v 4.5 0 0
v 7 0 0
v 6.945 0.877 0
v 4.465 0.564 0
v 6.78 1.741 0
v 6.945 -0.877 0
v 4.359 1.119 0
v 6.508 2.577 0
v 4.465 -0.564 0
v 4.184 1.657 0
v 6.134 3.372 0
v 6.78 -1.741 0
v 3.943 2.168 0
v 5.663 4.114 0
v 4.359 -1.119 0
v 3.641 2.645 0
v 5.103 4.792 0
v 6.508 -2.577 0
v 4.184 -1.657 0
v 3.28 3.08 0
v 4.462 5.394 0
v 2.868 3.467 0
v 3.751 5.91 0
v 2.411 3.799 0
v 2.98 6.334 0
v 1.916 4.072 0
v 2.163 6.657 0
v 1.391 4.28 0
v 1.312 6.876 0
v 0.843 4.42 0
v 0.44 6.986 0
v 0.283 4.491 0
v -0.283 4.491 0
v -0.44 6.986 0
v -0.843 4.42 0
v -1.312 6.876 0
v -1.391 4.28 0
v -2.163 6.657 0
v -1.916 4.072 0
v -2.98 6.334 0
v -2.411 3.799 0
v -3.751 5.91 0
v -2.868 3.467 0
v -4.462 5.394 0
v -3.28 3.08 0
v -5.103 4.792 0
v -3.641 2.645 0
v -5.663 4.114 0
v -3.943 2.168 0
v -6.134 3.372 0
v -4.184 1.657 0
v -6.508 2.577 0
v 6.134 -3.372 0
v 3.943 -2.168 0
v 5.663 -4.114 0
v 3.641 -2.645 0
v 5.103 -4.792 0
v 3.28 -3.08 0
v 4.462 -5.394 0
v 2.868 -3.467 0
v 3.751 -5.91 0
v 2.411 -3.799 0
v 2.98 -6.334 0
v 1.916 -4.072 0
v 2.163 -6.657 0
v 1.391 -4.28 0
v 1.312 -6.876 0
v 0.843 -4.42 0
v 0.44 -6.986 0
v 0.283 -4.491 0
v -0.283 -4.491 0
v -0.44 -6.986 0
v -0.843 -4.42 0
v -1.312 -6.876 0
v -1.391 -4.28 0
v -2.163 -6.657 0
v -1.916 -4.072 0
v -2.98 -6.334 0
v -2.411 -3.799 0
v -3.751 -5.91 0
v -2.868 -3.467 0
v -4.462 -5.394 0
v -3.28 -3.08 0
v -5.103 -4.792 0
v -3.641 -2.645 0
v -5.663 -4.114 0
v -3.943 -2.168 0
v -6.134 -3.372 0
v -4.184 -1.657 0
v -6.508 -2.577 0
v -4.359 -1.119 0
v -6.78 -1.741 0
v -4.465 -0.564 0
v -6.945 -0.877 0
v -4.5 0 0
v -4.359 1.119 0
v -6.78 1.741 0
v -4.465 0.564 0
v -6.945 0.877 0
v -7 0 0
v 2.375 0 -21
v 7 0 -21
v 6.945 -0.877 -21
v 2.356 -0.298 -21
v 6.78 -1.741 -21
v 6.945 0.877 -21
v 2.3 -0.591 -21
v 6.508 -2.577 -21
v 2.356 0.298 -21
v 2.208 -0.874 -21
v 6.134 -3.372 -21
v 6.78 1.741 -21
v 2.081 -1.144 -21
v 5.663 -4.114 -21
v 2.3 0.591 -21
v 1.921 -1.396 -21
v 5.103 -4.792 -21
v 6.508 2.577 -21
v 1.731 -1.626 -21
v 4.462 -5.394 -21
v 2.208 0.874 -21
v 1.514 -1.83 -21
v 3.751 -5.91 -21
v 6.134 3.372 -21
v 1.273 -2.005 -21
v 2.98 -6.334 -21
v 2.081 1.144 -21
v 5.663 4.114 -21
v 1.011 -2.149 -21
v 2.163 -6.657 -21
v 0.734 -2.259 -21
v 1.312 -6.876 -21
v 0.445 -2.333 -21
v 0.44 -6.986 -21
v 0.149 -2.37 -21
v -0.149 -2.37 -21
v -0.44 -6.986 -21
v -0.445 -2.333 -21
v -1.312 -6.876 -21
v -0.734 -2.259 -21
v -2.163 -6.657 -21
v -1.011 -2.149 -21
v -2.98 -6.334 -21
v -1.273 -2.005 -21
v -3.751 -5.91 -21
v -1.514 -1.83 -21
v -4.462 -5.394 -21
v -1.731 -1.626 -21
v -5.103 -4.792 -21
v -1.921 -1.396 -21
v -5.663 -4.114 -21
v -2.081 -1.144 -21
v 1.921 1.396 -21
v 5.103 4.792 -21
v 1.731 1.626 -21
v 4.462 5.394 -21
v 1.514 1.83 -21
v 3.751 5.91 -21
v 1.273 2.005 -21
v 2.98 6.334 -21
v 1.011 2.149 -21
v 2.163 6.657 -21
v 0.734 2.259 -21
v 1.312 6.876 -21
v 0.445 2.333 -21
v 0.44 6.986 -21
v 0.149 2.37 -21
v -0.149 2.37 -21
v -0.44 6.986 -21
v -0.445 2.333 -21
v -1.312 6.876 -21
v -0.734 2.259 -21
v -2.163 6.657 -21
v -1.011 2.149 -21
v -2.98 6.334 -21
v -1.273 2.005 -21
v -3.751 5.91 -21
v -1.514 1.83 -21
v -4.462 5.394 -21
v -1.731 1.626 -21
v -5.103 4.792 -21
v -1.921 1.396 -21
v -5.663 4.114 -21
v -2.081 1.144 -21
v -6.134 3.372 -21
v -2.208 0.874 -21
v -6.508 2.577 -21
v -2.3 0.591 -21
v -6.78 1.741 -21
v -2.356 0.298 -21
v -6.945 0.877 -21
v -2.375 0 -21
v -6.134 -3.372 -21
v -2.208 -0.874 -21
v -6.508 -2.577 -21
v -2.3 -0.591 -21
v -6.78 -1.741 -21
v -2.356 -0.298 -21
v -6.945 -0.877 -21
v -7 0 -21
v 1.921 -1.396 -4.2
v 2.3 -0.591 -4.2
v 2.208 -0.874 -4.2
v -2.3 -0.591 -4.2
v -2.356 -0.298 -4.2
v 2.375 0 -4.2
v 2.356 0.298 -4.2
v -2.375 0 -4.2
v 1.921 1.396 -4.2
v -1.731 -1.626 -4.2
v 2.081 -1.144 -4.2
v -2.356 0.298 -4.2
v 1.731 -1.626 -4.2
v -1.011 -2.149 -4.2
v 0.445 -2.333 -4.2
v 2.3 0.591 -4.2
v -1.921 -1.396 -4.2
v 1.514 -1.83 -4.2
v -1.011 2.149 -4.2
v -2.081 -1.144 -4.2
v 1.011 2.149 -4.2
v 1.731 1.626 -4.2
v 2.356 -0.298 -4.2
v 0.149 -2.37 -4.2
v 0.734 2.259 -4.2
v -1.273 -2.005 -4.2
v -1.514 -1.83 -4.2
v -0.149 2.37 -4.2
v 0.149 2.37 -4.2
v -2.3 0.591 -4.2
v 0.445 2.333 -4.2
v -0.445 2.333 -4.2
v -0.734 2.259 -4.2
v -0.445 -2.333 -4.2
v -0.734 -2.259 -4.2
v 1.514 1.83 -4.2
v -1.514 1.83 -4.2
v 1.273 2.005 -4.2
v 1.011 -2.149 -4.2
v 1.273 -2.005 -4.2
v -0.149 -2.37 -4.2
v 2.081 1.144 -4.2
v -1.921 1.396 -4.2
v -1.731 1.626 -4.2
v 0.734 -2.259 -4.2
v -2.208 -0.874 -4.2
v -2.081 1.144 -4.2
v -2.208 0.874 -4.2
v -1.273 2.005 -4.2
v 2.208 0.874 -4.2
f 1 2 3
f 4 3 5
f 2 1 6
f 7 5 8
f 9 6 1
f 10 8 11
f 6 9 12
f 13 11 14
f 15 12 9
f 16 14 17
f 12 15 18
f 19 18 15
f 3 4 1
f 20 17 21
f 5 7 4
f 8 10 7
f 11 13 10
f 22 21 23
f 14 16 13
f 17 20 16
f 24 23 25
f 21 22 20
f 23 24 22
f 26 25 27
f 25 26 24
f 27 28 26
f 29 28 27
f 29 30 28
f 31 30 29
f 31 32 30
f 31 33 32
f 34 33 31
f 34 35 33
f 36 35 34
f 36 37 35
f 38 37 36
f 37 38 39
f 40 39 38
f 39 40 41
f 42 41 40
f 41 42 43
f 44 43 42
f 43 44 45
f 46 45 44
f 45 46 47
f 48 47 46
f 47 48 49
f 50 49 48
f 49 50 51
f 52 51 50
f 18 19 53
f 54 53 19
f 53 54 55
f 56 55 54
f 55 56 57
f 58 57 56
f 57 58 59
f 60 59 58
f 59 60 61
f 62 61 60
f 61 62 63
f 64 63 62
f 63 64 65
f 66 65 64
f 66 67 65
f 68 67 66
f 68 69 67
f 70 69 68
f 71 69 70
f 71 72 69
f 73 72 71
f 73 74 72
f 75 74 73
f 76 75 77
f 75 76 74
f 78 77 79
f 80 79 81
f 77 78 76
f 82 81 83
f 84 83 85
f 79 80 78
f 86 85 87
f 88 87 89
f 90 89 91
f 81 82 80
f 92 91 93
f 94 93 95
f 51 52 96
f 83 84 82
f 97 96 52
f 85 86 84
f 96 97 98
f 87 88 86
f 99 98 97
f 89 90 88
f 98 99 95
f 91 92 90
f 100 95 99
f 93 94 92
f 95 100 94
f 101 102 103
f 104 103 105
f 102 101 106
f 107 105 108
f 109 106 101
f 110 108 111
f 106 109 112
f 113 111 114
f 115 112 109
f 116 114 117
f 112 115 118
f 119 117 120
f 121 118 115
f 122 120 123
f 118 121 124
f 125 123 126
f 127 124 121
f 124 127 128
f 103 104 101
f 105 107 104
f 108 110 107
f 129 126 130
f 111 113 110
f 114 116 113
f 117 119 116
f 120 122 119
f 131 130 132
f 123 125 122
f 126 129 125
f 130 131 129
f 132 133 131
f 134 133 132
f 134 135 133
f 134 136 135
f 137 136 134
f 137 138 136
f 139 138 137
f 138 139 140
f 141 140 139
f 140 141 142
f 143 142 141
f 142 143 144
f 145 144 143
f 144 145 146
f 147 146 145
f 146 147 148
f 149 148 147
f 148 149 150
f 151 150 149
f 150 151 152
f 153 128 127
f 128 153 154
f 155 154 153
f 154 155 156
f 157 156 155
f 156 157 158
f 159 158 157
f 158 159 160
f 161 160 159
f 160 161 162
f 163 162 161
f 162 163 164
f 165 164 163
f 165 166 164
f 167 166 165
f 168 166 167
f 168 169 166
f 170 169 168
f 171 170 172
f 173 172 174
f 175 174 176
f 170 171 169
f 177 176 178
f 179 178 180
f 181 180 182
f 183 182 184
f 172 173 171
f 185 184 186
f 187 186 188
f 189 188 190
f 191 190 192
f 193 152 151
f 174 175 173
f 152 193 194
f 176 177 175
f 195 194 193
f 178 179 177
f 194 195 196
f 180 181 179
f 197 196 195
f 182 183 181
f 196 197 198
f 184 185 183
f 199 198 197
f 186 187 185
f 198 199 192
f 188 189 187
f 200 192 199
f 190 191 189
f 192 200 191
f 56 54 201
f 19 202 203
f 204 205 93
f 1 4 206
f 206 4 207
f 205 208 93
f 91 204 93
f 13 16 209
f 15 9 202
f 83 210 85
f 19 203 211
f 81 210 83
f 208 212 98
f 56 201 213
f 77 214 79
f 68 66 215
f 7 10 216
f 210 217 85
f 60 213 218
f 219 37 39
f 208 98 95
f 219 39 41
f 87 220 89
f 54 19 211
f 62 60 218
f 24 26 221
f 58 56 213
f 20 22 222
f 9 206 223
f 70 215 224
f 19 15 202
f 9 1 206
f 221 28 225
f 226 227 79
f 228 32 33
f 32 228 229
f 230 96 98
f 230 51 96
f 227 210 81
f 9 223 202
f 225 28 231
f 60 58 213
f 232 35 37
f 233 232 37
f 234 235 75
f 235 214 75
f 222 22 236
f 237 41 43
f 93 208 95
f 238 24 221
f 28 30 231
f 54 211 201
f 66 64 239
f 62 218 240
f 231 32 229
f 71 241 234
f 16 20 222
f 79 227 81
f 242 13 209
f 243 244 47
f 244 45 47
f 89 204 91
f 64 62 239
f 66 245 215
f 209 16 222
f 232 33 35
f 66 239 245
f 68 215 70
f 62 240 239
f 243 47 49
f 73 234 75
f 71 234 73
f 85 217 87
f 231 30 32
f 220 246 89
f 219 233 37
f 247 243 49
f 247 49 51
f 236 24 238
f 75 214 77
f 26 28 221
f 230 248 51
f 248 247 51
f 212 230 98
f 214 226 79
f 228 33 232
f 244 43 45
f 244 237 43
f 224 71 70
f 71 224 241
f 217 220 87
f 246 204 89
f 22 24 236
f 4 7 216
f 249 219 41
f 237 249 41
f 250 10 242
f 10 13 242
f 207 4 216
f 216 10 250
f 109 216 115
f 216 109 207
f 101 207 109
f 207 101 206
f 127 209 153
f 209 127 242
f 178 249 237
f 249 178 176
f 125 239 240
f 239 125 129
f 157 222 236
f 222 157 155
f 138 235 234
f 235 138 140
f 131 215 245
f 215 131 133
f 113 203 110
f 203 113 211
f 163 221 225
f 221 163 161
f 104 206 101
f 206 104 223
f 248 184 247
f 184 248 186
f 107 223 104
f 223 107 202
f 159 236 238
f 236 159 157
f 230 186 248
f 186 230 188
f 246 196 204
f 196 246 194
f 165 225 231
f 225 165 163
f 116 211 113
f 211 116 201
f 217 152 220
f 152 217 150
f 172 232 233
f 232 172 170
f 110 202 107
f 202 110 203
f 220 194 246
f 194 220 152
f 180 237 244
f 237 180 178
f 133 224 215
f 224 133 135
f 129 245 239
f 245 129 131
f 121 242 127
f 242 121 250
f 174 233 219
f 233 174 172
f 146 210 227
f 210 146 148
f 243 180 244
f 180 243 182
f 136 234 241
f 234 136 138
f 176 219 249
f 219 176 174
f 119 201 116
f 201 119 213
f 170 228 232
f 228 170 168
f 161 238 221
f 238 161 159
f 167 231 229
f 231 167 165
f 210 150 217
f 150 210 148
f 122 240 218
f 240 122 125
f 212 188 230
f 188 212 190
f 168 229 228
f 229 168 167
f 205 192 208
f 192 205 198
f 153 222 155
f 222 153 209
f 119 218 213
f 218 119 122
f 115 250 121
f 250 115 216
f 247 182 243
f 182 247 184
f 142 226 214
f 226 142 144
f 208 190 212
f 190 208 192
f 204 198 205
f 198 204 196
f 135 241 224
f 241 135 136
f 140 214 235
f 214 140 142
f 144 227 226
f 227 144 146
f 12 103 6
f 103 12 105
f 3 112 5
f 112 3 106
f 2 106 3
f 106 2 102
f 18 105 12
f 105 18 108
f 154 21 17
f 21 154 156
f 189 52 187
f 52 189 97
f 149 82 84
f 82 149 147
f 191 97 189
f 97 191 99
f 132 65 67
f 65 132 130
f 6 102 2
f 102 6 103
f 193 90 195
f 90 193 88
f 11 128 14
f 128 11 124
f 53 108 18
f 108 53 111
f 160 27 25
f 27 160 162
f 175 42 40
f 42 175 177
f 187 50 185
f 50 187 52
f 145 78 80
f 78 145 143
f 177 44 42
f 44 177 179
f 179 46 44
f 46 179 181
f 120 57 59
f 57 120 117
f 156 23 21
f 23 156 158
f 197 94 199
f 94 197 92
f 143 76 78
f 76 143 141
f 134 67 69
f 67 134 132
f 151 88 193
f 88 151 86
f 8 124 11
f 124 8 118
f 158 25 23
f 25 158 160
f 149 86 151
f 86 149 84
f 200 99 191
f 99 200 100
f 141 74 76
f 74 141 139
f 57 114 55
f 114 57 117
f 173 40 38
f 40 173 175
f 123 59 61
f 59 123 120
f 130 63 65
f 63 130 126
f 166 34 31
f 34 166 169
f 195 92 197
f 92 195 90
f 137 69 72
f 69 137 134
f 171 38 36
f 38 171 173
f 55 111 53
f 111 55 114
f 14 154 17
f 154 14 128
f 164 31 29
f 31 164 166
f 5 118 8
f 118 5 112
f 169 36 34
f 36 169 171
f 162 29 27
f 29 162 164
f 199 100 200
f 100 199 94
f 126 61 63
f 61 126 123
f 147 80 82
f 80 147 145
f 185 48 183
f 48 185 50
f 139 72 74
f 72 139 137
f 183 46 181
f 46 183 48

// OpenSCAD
$fn = 50;


difference() {
	union() {
		translate(v = [0, 0, -21.0000000000]) {
			cylinder(h = 21, r = 7.0000000000);
		}
	}
	union() {
		translate(v = [0, 0, 0]) {
			rotate(a = [0, 0, 0]) {
				difference() {
					union() {
						#translate(v = [0, 0, -21.0000000000]) {
							cylinder(h = 21, r = 2.2500000000);
						}
						#translate(v = [0, 0, -4.2000000000]) {
							cylinder(h = 4.2000000000, r1 = 2.3750000000, r2 = 4.5000000000);
						}
						#translate(v = [0, 0, -21.0000000000]) {
							cylinder(h = 21, r = 2.3750000000);
						}
						#translate(v = [0, 0, -21.0000000000]) {
							cylinder(h = 21, r = 2.2500000000);
						}
					}
					union();
				}
			}
		}
	}
}
